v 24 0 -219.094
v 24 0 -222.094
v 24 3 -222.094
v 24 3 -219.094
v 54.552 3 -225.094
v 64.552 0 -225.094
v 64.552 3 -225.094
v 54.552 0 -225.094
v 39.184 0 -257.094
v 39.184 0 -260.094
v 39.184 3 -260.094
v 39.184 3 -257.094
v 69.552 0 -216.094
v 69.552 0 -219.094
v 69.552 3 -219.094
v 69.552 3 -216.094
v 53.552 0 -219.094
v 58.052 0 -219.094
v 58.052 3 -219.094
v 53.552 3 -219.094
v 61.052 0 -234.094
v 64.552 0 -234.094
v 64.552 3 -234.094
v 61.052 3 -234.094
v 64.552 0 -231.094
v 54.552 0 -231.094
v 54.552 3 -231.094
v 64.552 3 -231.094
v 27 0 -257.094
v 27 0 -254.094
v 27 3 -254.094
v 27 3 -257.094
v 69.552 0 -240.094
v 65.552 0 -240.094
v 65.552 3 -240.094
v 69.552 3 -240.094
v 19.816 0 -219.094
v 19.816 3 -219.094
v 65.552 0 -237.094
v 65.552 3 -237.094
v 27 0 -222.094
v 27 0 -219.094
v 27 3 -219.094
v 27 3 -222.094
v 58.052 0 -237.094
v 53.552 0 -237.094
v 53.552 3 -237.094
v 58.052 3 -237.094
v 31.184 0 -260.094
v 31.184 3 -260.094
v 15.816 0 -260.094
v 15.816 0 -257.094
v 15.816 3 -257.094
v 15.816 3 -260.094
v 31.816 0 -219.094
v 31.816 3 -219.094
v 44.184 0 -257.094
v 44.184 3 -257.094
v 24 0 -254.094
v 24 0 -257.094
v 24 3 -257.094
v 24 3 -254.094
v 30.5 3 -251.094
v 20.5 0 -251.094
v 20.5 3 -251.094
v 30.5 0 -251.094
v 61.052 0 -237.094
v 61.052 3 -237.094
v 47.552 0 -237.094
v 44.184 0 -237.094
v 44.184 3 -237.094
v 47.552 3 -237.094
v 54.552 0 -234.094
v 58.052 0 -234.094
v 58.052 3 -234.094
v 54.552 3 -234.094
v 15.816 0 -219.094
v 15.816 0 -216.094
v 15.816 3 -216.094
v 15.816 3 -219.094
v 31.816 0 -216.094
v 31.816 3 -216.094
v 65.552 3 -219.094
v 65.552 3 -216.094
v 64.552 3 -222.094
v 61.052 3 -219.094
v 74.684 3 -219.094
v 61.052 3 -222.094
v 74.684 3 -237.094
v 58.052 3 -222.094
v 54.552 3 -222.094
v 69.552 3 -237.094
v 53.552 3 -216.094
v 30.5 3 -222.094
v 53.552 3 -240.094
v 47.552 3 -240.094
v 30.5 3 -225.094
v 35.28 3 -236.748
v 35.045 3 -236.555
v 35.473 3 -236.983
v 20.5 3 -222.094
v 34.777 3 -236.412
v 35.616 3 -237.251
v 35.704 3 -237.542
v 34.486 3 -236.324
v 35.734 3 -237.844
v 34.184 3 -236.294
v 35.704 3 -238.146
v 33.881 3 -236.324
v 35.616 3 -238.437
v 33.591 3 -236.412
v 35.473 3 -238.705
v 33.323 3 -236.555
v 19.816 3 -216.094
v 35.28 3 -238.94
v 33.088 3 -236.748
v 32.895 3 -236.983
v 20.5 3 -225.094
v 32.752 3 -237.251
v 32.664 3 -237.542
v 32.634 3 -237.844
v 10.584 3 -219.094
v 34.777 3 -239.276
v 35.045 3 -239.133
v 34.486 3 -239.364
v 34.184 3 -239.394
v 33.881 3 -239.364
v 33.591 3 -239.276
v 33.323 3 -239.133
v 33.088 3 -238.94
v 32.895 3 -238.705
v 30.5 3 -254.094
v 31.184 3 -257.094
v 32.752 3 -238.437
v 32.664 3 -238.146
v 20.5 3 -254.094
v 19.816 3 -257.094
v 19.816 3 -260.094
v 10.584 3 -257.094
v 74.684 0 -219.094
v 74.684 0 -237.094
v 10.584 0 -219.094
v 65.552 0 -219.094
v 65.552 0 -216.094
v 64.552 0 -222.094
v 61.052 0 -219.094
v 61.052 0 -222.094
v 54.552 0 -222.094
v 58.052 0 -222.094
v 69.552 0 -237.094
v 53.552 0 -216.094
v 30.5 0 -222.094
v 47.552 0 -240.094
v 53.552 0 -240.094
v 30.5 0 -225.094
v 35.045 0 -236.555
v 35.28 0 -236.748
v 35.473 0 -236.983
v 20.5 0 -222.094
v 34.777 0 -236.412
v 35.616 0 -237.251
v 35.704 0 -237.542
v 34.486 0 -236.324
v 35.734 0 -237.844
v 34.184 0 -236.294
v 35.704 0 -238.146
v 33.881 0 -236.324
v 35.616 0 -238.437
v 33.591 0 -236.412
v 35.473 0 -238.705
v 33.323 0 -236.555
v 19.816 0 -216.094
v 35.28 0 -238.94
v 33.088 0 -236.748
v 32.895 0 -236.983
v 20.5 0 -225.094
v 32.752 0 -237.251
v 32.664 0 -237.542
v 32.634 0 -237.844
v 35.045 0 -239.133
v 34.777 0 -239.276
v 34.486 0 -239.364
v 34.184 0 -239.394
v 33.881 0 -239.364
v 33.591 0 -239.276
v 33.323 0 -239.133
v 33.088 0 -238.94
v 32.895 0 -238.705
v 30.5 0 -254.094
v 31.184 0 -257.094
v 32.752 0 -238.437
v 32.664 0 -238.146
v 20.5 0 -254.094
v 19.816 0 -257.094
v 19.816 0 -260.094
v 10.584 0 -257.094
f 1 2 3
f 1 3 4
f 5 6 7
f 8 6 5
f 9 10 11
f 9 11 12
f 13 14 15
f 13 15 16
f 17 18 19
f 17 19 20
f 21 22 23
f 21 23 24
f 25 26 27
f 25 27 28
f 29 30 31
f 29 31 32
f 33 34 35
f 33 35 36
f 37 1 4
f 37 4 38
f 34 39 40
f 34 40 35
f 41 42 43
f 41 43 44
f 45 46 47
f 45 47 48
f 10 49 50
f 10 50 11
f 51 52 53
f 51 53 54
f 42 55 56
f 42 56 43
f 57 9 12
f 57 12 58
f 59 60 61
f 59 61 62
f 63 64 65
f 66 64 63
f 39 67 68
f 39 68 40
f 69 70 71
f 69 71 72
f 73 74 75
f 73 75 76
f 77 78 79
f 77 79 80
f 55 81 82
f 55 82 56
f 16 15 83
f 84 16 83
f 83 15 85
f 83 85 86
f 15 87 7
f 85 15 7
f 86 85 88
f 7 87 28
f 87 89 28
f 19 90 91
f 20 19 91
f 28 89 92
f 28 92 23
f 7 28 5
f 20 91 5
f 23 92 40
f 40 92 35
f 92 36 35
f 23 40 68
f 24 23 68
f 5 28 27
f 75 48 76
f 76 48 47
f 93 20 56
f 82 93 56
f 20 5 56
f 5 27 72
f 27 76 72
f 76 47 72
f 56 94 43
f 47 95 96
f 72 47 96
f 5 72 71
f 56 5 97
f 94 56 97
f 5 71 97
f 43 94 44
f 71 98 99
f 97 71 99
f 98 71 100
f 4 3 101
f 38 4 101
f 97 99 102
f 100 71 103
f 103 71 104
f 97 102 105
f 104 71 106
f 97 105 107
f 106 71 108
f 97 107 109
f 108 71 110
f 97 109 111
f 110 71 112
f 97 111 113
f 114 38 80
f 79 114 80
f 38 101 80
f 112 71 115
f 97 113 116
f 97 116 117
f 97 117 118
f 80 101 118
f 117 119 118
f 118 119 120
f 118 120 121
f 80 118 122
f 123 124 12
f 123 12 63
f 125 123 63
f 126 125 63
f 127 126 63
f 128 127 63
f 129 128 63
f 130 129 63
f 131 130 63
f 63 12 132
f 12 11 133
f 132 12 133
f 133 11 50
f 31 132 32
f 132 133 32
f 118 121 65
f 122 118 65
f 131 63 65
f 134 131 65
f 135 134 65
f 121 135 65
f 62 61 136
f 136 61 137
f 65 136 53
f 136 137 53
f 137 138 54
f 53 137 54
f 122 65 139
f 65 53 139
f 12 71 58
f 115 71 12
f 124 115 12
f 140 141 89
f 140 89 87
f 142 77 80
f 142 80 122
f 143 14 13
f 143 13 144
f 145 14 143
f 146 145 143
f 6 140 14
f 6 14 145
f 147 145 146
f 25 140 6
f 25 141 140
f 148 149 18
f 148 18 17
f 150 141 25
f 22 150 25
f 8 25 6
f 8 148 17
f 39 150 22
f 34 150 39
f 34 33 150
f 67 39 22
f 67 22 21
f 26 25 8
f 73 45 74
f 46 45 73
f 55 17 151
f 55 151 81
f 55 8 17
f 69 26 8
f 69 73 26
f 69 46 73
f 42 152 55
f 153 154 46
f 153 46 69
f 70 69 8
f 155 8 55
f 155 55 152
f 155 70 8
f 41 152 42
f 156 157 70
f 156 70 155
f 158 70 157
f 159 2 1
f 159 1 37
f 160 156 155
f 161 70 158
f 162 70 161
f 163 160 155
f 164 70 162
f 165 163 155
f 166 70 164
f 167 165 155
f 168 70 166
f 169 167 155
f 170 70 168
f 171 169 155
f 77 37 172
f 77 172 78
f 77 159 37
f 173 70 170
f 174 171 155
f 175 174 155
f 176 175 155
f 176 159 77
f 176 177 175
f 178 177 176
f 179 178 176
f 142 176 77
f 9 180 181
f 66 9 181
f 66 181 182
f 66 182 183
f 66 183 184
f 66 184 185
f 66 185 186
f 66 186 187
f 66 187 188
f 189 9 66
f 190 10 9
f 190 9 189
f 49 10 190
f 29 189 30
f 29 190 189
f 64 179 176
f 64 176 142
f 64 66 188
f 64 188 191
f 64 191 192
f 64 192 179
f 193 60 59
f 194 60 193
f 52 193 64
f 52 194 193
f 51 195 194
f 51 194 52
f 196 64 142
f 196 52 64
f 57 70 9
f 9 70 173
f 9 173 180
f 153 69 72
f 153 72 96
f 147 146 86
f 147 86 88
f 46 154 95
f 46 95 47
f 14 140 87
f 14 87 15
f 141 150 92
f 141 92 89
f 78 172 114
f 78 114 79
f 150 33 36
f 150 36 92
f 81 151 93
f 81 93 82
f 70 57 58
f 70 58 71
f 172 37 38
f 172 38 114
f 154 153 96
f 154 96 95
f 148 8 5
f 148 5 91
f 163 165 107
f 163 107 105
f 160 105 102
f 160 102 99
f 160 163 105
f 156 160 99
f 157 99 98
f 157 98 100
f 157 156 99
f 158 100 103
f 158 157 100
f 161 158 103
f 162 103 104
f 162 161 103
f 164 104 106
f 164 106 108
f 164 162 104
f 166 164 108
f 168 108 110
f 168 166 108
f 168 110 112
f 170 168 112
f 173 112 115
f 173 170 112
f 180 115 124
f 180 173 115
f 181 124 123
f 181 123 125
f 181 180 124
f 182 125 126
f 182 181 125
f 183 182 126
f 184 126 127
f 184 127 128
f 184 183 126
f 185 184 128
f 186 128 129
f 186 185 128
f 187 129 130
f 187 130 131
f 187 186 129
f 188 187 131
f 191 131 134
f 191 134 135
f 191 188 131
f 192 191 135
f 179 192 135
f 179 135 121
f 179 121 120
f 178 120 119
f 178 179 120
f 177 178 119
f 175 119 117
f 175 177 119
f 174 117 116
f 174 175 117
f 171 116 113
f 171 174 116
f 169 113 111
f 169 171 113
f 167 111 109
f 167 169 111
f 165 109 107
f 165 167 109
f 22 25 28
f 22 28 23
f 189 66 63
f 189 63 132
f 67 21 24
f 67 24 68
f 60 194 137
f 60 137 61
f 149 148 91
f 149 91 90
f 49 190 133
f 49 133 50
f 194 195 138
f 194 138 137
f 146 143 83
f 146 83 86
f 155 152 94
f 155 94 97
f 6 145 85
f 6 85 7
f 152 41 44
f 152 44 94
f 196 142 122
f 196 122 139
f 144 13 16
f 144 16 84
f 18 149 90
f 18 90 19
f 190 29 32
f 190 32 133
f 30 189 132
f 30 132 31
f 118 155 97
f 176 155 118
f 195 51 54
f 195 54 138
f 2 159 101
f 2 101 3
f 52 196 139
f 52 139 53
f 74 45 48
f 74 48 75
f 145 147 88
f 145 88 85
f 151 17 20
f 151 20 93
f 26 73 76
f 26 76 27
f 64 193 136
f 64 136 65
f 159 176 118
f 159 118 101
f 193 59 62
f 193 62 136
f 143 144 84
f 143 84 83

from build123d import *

# Parameters (mm, degrees)
SKETCH1_R           = 1.55
BOSS_EXTRUDE1_DEPTH = 3


with BuildPart() as part:
    # Sketch1 → Boss-Extrude1 (new body)
    with BuildSketch(Plane(origin=(0, 0, 0), x_dir=(1, 0, 0), z_dir=(0, 1, 0))):
        Polygon((74.683753319, 219.09410576), (69.551868319, 219.09410576), (69.551868319, 216.09410576), (65.551868319, 216.09410576), (65.551868319, 219.09410576), (61.051868319, 219.09410576), (61.051868319, 222.09410576), (64.551868319, 222.09410576), (64.551868319, 225.09410576), (54.551868319, 225.09410576), (54.551868319, 222.09410576), (58.051868319, 222.09410576), (58.051868319, 219.09410576), (53.551868319, 219.09410576), (53.551868319, 216.09410576), (31.815637319, 216.09410576), (31.815637319, 219.09410576), (26.999695069, 219.09410576), (26.999695069, 222.09410576), (30.499695069, 222.09410576), (30.499695069, 225.09410576), (20.499695069, 225.09410576), (20.499695069, 222.09410576), (23.999695069, 222.09410576), (23.999695069, 219.09410576), (19.815637319, 219.09410576), (19.815637319, 216.09410576), (15.815637319, 216.09410576), (15.815637319, 219.09410576), (10.583753319, 219.09410576), (10.583753319, 257.09410576), (15.815637319, 257.09410576), (15.815637319, 260.09410576), (19.815637319, 260.09410576), (19.815637319, 257.09410576), (23.999695069, 257.09410576), (23.999695069, 254.09410576), (20.499695069, 254.09410576), (20.499695069, 251.09410576), (30.499695069, 251.09410576), (30.499695069, 254.09410576), (26.999695069, 254.09410576), (26.999695069, 257.09410576), (31.183752819, 257.09410576), (31.183752819, 260.09410576), (39.183752819, 260.09410576), (39.183752819, 257.09410576), (44.183752819, 257.09410576), (44.183752819, 237.09410576), (47.551868319, 237.09410576), (47.551868319, 240.09410576), (53.551868319, 240.09410576), (53.551868319, 237.09410576), (58.051868319, 237.09410576), (58.051868319, 234.09410576), (54.551868319, 234.09410576), (54.551868319, 231.09410576), (64.551868319, 231.09410576), (64.551868319, 234.09410576), (61.051868319, 234.09410576), (61.051868319, 237.09410576), (65.551868319, 237.09410576), (65.551868319, 240.09410576), (69.551868319, 240.09410576), (69.551868319, 237.09410576), (74.683753319, 237.09410576), align=None)
        with Locations(Location((34.183752819, 237.84410576, 0), (0, 0, 270))):
            Circle(SKETCH1_R, mode=Mode.SUBTRACT)
    extrude(amount=BOSS_EXTRUDE1_DEPTH)


solid = part.part
